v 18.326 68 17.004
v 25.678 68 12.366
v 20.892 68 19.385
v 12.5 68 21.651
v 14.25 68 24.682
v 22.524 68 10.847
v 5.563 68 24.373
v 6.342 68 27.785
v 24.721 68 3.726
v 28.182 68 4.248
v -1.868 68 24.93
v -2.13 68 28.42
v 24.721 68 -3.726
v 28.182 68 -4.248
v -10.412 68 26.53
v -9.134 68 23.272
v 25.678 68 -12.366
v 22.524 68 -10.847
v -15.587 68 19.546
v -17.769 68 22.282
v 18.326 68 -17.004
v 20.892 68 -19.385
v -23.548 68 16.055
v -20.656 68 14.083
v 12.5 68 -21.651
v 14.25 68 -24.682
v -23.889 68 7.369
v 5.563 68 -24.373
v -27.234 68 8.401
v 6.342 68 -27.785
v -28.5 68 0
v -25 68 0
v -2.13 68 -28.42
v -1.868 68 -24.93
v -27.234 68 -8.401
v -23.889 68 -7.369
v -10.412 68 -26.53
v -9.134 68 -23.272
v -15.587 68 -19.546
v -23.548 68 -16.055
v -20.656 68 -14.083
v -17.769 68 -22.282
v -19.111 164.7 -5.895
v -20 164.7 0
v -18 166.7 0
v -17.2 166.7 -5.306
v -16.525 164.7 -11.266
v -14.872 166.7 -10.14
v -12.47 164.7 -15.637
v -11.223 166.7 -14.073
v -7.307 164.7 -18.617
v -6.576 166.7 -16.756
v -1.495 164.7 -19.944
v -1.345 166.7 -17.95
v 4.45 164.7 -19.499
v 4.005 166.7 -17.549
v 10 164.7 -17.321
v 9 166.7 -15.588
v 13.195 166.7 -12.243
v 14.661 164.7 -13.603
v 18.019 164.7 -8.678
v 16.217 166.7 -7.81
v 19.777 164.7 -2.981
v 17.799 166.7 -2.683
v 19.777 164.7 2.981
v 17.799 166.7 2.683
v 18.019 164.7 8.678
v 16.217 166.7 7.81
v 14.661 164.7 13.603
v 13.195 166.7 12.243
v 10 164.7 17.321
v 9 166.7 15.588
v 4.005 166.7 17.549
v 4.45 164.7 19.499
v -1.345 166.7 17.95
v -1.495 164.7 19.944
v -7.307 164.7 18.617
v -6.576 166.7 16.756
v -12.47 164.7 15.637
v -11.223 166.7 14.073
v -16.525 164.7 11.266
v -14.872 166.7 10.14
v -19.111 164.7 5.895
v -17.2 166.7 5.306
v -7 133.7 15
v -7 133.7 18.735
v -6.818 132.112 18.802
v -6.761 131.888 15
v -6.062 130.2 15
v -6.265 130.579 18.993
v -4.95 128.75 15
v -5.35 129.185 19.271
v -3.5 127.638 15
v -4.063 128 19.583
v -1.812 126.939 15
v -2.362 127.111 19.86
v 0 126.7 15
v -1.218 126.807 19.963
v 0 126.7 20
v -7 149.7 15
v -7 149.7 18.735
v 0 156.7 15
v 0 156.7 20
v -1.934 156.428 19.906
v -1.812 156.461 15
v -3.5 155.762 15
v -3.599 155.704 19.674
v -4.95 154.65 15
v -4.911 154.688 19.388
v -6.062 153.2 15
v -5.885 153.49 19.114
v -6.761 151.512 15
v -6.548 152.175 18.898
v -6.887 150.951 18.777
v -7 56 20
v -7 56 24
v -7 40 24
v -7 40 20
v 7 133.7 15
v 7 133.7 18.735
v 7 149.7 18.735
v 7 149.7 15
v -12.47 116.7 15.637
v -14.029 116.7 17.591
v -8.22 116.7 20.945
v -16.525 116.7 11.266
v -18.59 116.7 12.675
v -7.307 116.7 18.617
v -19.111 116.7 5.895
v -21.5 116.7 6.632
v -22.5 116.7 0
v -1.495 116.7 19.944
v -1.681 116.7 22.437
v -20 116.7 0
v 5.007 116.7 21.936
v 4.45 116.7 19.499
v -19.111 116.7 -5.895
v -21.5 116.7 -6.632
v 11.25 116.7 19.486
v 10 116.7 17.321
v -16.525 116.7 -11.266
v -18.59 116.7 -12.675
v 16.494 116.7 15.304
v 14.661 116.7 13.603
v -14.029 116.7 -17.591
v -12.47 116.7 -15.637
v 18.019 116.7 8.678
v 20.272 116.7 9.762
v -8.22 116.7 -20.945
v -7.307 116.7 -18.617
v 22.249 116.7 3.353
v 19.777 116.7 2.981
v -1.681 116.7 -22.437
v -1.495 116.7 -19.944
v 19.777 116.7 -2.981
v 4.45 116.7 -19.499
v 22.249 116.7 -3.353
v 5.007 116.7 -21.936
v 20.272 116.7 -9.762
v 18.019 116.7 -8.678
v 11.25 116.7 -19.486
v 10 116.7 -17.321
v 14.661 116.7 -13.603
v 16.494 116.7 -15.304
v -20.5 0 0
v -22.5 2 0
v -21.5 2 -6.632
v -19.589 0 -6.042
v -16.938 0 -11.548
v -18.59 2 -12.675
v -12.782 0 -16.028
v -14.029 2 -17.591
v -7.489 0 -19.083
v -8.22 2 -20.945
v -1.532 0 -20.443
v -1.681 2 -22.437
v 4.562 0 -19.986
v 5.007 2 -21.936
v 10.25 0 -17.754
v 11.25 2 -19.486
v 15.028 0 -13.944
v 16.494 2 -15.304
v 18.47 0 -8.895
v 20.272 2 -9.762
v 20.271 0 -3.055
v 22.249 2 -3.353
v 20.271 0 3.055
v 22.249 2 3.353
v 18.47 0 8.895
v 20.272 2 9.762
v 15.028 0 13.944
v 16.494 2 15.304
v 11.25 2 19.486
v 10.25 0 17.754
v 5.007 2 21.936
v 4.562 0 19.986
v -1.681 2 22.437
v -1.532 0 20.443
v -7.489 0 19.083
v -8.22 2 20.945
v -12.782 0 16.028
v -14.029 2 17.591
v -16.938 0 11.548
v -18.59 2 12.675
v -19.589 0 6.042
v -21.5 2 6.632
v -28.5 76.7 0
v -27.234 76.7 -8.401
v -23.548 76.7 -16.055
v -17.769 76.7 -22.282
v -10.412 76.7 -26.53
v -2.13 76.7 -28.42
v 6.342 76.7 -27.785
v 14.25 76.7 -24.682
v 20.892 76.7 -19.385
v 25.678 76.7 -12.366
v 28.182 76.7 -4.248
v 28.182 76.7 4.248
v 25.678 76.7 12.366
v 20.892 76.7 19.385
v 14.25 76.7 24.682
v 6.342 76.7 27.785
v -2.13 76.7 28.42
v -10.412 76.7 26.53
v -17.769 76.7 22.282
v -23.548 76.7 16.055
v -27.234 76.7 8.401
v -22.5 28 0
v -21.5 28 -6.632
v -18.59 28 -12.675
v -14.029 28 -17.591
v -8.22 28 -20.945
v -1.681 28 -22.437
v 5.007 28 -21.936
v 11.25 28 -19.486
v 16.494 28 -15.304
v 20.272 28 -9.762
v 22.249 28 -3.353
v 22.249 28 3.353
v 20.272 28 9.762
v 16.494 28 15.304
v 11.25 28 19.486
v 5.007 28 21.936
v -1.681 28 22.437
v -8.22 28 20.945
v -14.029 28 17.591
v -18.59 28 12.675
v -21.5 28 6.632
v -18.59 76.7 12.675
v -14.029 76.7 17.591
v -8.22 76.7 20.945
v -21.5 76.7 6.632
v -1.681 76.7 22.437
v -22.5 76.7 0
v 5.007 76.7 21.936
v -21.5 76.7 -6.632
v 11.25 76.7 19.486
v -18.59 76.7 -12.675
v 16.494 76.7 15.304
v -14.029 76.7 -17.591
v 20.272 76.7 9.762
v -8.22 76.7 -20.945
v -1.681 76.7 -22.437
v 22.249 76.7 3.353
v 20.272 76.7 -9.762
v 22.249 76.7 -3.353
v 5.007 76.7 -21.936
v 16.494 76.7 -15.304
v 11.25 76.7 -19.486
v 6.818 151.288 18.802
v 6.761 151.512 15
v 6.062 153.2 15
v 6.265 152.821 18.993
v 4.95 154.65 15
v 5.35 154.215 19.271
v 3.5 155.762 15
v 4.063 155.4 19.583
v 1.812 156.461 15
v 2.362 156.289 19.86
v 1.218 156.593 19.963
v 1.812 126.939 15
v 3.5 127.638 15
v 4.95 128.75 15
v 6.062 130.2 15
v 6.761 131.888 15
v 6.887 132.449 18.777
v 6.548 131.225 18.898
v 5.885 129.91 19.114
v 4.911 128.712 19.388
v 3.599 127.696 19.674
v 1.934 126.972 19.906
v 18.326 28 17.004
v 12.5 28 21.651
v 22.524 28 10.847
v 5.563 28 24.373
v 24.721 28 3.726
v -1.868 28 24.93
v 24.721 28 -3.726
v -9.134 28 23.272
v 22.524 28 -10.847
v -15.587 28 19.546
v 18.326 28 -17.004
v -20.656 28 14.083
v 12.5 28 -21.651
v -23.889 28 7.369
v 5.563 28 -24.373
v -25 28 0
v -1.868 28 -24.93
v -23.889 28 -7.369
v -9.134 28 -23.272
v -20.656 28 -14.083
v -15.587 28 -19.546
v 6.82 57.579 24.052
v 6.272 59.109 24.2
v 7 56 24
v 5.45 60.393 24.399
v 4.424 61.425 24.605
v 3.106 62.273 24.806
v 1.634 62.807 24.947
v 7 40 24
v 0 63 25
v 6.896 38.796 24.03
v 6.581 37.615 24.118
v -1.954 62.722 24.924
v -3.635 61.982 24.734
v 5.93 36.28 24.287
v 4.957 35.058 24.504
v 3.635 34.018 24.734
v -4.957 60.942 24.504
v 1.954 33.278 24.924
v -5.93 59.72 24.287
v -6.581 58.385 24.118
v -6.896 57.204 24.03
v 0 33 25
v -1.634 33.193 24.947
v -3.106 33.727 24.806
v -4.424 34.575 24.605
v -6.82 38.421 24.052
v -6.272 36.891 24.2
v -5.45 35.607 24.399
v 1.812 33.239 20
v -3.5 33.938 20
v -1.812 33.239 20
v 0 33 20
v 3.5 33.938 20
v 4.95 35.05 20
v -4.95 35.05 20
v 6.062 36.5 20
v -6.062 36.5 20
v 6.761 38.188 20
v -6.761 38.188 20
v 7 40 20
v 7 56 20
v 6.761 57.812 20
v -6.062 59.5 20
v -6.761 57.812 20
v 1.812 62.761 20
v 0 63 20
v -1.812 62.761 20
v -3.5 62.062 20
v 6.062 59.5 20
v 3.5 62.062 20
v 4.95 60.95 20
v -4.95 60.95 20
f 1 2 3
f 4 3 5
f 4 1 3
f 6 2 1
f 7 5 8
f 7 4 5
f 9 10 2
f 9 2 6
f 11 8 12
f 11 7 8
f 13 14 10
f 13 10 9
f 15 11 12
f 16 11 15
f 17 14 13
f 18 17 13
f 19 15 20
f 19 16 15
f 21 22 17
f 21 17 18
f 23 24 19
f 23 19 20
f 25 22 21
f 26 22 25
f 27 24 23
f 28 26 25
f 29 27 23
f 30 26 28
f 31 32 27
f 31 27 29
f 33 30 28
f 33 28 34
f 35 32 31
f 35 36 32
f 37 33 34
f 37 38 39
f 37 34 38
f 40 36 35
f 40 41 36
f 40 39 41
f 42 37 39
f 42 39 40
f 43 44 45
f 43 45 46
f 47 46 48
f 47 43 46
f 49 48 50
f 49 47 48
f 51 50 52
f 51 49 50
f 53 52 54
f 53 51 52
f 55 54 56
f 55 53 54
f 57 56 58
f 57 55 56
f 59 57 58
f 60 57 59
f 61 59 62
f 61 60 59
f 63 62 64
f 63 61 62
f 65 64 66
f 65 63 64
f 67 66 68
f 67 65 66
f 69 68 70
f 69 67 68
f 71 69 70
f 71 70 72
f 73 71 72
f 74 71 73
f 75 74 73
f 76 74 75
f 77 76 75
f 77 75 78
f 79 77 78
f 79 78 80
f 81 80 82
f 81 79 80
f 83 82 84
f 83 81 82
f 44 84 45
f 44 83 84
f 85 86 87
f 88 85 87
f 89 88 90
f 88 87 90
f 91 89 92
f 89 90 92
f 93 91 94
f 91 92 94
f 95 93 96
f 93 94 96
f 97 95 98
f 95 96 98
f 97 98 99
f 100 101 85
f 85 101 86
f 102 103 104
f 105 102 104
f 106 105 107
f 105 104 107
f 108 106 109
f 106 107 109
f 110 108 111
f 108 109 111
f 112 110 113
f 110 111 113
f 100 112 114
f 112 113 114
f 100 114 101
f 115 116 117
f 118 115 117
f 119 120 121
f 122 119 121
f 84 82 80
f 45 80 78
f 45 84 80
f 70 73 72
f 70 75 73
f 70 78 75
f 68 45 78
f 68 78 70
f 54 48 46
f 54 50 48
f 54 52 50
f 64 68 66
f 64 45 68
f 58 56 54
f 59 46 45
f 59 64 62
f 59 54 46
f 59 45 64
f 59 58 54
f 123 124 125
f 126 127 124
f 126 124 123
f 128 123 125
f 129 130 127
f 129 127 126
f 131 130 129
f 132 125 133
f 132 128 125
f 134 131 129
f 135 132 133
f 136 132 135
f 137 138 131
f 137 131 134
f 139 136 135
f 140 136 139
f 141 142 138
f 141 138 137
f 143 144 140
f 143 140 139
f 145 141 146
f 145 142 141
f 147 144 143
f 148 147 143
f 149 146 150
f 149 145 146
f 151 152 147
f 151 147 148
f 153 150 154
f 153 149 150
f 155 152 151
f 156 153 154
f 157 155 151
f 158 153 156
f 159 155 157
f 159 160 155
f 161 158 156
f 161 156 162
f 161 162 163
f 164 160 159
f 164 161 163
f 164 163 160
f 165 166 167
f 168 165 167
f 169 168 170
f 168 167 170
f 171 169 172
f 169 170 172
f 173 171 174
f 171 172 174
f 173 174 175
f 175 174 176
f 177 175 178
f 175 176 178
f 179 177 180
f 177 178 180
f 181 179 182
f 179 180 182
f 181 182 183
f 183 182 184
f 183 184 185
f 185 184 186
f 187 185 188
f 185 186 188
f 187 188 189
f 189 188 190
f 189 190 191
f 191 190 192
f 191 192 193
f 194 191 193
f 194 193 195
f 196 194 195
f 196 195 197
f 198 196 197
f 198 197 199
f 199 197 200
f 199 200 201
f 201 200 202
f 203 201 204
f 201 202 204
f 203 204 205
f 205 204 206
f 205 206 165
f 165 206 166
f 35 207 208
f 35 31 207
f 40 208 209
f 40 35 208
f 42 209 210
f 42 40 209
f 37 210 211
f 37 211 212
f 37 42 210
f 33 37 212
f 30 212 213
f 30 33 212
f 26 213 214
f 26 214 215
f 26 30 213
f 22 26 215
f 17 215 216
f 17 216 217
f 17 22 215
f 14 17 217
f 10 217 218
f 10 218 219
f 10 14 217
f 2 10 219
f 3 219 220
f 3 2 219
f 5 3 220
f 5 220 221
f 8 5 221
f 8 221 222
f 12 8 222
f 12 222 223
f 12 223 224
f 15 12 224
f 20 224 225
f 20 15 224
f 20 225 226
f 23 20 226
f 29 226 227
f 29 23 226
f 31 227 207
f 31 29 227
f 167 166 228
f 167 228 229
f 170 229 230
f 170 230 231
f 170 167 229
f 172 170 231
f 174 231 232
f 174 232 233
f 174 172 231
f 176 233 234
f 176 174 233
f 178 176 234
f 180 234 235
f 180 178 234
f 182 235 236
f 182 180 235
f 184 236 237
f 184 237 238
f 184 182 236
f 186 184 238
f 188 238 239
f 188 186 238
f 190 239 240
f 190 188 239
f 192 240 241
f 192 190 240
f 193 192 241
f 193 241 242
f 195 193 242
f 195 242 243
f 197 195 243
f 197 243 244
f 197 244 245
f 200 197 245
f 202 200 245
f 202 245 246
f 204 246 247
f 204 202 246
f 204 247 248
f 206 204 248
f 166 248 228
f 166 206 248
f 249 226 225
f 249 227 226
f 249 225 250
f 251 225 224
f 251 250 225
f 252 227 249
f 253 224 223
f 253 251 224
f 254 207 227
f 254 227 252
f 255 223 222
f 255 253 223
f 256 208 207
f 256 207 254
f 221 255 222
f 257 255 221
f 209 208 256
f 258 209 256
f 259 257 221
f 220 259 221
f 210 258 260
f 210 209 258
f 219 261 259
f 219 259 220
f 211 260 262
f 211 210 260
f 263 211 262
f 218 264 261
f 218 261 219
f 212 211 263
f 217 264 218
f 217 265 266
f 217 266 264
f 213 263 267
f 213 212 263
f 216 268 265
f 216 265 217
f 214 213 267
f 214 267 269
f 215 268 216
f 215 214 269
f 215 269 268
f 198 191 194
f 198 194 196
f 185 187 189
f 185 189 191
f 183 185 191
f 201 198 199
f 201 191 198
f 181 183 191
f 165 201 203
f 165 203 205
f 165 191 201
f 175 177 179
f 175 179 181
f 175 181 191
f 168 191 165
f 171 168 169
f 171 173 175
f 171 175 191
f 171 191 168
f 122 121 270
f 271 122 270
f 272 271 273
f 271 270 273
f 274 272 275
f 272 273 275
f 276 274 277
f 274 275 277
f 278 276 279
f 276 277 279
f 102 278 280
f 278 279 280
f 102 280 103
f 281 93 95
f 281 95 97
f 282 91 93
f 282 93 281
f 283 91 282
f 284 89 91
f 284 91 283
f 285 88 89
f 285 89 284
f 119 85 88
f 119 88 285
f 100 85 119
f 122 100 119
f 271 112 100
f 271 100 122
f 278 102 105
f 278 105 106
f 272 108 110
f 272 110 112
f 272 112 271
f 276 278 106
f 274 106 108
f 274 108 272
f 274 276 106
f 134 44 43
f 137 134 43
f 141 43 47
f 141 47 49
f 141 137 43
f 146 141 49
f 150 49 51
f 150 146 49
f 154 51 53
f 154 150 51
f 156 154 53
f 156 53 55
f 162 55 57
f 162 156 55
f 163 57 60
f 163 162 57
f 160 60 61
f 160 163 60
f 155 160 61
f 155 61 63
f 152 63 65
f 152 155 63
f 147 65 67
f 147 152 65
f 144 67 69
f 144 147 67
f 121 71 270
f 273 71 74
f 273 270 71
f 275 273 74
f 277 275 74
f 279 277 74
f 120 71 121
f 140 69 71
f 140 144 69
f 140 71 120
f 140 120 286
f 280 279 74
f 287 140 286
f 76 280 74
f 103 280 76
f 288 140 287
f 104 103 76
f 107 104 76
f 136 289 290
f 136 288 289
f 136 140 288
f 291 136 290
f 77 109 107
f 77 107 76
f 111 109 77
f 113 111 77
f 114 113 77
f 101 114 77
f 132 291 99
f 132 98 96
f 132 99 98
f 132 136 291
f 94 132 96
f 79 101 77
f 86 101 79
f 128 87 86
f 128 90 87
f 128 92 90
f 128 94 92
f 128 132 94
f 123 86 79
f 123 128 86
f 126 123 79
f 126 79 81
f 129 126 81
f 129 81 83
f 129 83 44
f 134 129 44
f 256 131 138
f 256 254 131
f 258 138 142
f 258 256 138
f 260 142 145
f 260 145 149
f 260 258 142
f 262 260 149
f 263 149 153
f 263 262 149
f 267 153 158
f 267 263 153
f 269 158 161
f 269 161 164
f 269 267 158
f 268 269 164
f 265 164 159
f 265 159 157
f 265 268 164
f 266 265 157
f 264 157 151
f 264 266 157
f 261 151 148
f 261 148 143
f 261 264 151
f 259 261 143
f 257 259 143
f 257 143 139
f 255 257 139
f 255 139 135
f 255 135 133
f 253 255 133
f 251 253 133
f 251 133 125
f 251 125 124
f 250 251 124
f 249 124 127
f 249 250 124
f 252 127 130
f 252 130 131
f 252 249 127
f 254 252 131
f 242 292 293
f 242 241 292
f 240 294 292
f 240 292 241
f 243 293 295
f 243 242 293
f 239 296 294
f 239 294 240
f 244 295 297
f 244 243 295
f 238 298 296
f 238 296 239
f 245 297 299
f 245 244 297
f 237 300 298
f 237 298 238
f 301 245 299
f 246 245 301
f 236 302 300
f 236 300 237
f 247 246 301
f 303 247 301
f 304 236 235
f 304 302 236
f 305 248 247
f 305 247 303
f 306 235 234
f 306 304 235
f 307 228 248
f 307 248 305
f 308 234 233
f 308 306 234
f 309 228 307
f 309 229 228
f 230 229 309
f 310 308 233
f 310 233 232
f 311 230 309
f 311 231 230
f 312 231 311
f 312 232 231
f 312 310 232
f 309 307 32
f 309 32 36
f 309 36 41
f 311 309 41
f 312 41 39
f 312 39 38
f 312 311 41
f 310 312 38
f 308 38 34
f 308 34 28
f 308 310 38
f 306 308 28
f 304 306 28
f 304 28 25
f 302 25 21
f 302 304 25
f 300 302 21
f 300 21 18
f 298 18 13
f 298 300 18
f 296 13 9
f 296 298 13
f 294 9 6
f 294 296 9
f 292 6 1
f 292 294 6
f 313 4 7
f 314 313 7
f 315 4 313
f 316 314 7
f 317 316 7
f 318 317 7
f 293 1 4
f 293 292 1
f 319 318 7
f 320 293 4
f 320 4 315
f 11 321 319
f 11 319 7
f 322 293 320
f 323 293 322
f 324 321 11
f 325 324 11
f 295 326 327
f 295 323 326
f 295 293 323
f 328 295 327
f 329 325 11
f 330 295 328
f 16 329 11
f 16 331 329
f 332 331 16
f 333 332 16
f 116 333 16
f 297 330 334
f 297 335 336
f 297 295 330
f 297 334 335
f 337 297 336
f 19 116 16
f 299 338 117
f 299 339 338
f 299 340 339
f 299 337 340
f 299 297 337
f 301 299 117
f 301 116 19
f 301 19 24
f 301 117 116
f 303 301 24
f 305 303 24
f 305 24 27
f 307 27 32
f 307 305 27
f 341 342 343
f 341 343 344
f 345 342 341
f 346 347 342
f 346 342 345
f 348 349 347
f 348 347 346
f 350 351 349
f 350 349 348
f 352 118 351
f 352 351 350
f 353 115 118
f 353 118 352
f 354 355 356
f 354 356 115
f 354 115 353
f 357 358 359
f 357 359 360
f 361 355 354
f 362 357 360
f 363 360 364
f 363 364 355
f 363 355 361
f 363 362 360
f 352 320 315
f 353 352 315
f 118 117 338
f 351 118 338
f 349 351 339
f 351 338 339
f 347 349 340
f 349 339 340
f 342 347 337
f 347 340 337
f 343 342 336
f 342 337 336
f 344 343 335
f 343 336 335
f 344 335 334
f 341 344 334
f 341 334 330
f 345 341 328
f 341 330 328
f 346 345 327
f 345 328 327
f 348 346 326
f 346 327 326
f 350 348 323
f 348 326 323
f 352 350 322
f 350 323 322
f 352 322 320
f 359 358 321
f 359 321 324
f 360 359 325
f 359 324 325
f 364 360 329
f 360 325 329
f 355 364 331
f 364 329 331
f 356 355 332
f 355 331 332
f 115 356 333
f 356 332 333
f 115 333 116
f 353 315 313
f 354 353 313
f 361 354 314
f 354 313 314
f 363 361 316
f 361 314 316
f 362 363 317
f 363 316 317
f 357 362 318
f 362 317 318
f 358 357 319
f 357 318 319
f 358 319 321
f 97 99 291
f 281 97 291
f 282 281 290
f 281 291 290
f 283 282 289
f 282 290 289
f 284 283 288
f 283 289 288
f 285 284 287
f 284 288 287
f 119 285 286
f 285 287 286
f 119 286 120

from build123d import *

# Parameters (mm, degrees)
F2_SIZE  = 2
F5_DEPTH = 5
F6_DEPTH = 10


with BuildPart() as f1:
    # F0 (on Top) → F1 (revolve)
    with BuildSketch(Plane.XY):
        Polygon((-22.5, 0), (0, 0), (0, 166.7), (-20, 166.7), (-20, 116.7), (-22.5, 116.7), (-22.5, 76.7), (-28.5, 76.7), (-28.5, 68), (-25, 68), (-25, 28), (-22.5, 28), align=None)
    revolve(axis=Axis((0, 59.789897, 0), (0, -1, 0)))

    # F2
    f2_edges = [f1.edges().sort_by_distance(p)[0] for p in [
        (20, 166.7, 0),
        (22.5, 0, 0),
    ]]
    chamfer(f2_edges, length=F2_SIZE)

    # F4 (on offset) → F5 (cut)
    with BuildSketch(Plane.XY.offset(25)):
        with BuildLine():
            Line((7, 40), (7, 56))
            ThreePointArc((7, 56), (4.949747, 60.949747), (0, 63))
            ThreePointArc((0, 63), (-4.949747, 60.949747), (-7, 56))
            Line((-7, 56), (-7, 40))
            ThreePointArc((-7, 40), (-4.949747, 35.050253), (0, 33))
            ThreePointArc((0, 33), (4.949747, 35.050253), (7, 40))
        make_face()
    extrude(amount=-F5_DEPTH, mode=Mode.SUBTRACT)

    # F4 (on offset) → F6 (cut)
    with BuildSketch(Plane.XY.offset(25)):
        with BuildLine():
            Line((7, 133.7), (7, 149.7))
            ThreePointArc((7, 149.7), (4.949747, 154.649747), (0, 156.7))
            ThreePointArc((0, 156.7), (-4.949747, 154.649747), (-7, 149.7))
            Line((-7, 149.7), (-7, 133.7))
            ThreePointArc((-7, 133.7), (-4.949747, 128.750253), (0, 126.7))
            ThreePointArc((0, 126.7), (4.949747, 128.750253), (7, 133.7))
        make_face()
    extrude(amount=-F6_DEPTH, mode=Mode.SUBTRACT)


solid = f1.part
